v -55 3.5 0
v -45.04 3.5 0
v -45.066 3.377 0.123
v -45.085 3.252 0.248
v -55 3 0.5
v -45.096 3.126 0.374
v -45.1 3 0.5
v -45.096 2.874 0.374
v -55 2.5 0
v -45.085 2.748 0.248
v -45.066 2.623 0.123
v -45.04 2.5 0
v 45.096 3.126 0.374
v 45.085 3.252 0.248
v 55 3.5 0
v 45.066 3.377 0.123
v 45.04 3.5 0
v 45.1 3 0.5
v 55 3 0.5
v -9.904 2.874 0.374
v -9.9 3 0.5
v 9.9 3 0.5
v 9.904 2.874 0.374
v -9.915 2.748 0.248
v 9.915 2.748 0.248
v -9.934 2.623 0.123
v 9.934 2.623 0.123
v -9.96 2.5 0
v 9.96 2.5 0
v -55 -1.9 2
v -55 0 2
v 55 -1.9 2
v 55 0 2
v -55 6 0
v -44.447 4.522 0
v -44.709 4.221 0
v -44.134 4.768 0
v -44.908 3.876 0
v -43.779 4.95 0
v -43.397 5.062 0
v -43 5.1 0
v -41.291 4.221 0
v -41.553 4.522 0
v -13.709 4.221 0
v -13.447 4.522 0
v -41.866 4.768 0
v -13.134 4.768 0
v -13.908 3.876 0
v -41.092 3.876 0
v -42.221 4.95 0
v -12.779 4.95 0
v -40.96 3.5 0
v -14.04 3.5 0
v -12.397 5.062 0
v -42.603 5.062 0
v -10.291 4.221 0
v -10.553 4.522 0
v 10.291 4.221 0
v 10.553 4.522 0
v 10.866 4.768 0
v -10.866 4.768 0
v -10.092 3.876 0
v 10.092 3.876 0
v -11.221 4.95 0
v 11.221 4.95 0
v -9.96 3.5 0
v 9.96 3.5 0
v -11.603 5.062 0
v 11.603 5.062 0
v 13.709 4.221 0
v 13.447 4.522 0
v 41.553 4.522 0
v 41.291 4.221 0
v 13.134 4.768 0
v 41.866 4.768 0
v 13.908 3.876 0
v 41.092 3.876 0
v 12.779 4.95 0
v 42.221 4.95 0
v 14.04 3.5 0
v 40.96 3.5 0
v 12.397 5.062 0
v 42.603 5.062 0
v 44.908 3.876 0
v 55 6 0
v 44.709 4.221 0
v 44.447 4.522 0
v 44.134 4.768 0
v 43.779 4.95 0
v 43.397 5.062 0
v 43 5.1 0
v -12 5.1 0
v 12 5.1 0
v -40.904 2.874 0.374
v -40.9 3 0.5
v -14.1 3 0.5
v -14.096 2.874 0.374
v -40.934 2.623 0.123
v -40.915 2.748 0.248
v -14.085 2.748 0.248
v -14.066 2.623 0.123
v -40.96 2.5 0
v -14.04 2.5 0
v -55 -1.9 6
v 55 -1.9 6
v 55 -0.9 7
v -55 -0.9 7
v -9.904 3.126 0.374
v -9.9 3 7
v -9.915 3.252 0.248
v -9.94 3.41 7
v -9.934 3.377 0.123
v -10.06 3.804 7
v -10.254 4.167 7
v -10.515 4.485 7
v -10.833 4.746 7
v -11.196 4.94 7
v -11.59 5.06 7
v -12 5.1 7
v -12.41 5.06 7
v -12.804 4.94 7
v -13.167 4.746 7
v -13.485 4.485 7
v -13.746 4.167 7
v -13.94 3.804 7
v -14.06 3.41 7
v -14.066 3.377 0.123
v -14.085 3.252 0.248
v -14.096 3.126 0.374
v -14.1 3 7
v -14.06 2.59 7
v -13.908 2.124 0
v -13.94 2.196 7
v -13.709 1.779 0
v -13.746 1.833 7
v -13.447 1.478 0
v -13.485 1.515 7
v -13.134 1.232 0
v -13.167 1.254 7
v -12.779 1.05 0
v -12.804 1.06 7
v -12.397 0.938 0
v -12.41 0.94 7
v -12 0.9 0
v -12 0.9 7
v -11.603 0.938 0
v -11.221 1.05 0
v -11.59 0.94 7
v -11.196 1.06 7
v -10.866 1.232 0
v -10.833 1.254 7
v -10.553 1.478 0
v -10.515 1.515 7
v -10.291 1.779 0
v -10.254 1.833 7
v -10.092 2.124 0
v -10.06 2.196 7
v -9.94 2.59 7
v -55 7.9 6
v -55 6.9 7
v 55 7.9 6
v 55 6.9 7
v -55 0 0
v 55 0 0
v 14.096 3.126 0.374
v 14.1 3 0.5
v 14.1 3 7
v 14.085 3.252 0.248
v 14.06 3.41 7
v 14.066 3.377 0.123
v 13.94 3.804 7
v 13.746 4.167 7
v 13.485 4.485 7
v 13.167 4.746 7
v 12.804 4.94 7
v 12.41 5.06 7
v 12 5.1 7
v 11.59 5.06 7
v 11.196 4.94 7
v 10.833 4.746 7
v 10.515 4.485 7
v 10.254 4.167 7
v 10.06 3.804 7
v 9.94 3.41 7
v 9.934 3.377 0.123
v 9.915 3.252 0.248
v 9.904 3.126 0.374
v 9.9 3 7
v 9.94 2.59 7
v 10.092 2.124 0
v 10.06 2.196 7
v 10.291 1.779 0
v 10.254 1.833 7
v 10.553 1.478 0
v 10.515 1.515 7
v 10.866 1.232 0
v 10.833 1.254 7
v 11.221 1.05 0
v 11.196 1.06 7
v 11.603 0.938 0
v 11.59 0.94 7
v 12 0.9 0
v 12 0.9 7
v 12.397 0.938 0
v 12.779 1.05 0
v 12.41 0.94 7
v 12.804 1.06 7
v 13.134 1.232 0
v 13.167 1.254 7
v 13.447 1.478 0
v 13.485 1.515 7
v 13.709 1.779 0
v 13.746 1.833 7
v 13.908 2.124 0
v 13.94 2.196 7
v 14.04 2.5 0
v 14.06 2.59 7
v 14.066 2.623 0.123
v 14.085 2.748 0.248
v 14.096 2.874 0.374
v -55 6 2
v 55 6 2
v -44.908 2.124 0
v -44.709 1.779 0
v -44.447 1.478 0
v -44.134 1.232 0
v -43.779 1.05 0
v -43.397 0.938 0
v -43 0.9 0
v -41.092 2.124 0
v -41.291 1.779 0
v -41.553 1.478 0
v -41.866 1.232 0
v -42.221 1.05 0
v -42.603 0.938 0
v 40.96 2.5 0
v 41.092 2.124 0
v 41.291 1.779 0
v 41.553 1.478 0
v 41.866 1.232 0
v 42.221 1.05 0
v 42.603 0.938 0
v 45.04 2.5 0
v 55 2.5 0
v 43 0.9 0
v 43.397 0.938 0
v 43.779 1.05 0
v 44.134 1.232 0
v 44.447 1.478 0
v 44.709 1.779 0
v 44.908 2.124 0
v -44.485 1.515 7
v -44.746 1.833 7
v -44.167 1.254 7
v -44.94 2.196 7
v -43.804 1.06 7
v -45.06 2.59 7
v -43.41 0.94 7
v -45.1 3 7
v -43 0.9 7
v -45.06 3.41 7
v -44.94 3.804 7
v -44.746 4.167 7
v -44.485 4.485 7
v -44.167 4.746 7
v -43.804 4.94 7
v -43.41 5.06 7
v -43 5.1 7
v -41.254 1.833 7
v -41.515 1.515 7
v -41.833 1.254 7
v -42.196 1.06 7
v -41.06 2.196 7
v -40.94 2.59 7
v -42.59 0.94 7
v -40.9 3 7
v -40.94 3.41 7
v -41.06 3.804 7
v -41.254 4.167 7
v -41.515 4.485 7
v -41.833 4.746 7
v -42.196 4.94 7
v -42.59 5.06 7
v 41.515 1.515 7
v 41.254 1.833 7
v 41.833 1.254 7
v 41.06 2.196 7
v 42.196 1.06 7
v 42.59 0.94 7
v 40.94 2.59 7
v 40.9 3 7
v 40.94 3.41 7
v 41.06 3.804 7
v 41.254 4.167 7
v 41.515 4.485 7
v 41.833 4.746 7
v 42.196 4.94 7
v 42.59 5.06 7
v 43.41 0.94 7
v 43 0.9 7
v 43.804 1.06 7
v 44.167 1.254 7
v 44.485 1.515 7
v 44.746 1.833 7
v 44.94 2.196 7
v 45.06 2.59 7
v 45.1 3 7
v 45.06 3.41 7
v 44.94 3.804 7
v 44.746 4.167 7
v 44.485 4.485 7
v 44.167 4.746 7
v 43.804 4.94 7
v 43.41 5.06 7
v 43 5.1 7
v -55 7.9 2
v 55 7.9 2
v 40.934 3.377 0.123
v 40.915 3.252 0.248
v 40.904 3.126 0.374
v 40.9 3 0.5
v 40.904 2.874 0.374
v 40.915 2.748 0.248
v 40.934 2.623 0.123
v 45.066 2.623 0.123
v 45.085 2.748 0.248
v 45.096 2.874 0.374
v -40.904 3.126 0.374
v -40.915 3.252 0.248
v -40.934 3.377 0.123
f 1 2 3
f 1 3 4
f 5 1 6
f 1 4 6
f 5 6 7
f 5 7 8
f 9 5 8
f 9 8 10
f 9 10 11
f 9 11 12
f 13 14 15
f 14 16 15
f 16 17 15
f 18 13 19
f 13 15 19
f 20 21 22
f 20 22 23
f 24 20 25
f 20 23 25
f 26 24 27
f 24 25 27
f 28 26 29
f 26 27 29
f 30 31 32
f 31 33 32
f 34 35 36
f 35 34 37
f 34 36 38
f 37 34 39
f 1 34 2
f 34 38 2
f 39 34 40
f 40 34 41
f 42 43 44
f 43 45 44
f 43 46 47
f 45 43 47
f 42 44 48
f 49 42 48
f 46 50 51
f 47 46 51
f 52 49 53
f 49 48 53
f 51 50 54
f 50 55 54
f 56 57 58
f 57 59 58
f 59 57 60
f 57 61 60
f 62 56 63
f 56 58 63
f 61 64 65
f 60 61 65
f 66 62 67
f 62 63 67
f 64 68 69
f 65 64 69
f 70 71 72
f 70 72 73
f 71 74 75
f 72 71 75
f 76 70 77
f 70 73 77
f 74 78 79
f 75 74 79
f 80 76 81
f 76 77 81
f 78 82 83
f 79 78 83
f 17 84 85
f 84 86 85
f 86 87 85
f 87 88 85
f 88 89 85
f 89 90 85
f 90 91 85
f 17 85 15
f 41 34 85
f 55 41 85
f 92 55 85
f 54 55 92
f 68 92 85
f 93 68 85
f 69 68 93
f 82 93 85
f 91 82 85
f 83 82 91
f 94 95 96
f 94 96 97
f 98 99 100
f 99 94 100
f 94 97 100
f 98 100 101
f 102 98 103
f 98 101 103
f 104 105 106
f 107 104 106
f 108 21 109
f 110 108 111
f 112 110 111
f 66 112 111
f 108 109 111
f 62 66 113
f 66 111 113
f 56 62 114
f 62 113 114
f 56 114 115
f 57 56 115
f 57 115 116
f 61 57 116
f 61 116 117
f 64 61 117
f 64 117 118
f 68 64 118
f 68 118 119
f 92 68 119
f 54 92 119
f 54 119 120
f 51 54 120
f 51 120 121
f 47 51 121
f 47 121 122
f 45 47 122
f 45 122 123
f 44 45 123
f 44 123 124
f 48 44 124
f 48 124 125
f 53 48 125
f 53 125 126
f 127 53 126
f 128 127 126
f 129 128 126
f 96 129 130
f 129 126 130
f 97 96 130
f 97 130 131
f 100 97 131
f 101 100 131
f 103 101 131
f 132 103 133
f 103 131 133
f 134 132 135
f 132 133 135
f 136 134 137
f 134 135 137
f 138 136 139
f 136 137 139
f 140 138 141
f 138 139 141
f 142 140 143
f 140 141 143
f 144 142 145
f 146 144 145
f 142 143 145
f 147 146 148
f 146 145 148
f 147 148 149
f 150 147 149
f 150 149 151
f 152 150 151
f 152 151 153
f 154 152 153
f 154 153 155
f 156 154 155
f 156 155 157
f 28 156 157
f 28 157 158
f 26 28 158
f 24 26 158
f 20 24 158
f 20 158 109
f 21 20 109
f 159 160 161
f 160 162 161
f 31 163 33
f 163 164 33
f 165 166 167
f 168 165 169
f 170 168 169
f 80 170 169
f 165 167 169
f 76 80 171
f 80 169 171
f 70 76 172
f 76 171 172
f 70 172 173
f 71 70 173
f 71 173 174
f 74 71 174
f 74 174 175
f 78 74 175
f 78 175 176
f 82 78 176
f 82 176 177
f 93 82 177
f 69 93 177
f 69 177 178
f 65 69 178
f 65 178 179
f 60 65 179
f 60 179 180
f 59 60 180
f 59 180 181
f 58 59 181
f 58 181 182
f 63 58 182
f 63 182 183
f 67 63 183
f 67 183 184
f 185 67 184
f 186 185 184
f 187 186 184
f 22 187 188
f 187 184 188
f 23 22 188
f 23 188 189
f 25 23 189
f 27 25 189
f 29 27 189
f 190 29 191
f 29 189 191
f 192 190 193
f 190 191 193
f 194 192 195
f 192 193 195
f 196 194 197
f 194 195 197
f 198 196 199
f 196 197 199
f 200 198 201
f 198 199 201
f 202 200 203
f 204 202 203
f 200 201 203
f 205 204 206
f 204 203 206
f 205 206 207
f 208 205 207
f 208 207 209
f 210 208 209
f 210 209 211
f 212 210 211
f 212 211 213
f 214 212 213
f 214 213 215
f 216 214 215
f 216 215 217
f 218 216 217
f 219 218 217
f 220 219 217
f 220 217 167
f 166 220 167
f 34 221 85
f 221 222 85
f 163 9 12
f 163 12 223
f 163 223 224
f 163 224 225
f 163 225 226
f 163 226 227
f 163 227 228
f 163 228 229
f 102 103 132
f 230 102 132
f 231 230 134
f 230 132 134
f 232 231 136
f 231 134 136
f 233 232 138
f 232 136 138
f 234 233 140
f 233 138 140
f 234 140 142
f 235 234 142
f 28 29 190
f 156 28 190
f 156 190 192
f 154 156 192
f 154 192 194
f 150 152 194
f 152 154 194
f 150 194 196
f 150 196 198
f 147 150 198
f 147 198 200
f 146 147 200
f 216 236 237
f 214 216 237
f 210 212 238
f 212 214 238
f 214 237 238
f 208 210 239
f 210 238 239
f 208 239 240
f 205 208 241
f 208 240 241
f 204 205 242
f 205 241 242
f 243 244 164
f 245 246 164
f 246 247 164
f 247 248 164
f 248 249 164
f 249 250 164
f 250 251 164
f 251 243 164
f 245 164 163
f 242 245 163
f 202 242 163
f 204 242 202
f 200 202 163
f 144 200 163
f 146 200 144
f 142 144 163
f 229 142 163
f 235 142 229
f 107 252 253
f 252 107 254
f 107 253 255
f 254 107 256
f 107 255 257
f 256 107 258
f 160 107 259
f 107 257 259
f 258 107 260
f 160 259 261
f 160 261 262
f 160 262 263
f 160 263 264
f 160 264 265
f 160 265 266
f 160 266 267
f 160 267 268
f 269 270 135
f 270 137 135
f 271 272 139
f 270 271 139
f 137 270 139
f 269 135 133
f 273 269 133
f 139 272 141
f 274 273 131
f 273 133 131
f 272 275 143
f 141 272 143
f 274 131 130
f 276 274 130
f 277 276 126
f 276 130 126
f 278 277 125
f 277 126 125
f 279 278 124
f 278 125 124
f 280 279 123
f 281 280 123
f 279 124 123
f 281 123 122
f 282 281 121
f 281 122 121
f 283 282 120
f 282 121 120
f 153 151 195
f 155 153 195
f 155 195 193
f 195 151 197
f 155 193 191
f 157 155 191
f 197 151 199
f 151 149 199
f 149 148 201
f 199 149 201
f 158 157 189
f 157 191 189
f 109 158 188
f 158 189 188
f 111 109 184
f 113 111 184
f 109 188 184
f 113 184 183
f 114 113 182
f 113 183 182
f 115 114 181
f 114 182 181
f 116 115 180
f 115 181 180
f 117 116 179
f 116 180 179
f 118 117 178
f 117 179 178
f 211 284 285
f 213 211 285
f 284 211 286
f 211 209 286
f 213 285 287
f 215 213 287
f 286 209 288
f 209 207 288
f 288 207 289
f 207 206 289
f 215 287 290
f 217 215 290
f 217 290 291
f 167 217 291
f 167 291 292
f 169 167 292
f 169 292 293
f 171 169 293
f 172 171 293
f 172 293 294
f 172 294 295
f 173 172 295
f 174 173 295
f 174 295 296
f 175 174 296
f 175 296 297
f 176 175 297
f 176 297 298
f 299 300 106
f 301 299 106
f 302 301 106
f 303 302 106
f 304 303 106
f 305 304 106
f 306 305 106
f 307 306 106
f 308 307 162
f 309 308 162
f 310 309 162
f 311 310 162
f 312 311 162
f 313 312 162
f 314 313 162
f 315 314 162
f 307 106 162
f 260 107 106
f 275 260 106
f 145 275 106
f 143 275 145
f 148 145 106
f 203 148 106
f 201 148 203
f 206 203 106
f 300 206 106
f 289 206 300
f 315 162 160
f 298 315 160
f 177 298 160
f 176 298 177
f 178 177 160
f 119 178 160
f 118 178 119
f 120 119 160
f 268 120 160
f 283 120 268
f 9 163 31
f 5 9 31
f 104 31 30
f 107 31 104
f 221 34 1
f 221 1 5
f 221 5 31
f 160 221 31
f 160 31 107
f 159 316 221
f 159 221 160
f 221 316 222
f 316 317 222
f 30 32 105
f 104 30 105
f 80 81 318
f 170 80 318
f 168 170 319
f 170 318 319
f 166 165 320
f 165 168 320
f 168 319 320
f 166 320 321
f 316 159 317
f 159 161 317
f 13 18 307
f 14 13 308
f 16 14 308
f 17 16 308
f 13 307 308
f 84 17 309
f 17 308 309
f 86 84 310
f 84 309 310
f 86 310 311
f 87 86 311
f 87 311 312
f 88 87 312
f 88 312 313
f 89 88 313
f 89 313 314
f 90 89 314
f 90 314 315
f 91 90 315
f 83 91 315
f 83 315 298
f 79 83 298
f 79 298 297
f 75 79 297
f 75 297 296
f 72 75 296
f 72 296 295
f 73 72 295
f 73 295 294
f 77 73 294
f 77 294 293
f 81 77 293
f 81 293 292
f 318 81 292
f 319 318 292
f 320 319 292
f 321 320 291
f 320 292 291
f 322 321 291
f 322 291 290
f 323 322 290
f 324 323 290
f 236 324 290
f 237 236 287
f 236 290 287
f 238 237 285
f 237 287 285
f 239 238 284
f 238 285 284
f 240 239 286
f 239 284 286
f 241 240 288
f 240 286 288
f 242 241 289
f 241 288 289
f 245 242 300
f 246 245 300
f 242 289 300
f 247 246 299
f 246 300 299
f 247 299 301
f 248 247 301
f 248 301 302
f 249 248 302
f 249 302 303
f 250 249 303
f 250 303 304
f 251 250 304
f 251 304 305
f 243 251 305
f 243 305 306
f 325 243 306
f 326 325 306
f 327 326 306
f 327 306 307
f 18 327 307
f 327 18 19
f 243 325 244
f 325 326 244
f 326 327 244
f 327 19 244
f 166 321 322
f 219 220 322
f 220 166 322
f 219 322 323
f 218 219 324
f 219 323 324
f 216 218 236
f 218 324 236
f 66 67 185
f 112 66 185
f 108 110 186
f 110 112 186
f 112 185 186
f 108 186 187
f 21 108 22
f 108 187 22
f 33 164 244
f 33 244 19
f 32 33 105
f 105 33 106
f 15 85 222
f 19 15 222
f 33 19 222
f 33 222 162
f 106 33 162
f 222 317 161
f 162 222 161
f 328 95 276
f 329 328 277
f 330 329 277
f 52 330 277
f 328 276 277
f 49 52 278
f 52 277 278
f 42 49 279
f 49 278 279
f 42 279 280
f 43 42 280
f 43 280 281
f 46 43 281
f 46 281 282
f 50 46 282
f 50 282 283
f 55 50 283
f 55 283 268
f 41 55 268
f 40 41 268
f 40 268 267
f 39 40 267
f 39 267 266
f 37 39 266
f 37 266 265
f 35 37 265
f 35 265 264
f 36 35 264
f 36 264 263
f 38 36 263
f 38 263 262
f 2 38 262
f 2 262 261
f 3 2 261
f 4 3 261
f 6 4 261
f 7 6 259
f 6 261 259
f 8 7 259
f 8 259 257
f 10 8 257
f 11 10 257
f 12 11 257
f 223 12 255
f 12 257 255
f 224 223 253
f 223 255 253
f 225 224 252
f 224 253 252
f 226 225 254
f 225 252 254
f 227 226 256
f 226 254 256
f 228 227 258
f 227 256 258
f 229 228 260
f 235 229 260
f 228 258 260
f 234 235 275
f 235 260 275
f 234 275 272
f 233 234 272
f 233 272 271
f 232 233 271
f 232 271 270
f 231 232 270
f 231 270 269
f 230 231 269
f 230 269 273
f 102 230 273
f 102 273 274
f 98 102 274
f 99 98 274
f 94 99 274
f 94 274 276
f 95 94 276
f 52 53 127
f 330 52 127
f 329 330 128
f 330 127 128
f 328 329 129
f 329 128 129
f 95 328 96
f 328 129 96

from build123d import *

# Parameters (mm, degrees)
EXTRUDE_1_DEPTH        = 55
HOLE_WIZARD_M5_1_D     = 4.2
HOLE_WIZARD_M5_1_DEPTH = 52.4
HOLE_WIZARD_M5_1_TIP   = 1.2618073


with BuildPart() as part:
    # 草图1 → 凸台-拉伸1 (new, symmetric)
    with BuildSketch(Plane(origin=(0, 0, 0), x_dir=(0, 0, -1), z_dir=(1, 0, 0))):
        Polygon((-7, -0.9), (-7, 6.9), (-6, 7.9), (-2, 7.9), (-2, 6), (0, 6), (0, 3.5), (-0.5, 3), (0, 2.5), (0, 0), (-2, 0), (-2, -1.9), (-6, -1.9), align=None)
    extrude(amount=EXTRUDE_1_DEPTH, both=True)

    # M5 螺纹孔1
    with Locations(Plane(origin=(43, 3, 0), x_dir=(-1, 0, 0), z_dir=(0, 0, -1))):
        with Locations((0, 0), (31, 0), (55, 0), (86, 0)):
            Hole(HOLE_WIZARD_M5_1_D / 2, depth=HOLE_WIZARD_M5_1_DEPTH)
            with Locations((0, 0, -(HOLE_WIZARD_M5_1_DEPTH + HOLE_WIZARD_M5_1_TIP / 2))):  # 118° drill point
                Cone(0, HOLE_WIZARD_M5_1_D / 2, HOLE_WIZARD_M5_1_TIP, mode=Mode.SUBTRACT)


solid = part.part
